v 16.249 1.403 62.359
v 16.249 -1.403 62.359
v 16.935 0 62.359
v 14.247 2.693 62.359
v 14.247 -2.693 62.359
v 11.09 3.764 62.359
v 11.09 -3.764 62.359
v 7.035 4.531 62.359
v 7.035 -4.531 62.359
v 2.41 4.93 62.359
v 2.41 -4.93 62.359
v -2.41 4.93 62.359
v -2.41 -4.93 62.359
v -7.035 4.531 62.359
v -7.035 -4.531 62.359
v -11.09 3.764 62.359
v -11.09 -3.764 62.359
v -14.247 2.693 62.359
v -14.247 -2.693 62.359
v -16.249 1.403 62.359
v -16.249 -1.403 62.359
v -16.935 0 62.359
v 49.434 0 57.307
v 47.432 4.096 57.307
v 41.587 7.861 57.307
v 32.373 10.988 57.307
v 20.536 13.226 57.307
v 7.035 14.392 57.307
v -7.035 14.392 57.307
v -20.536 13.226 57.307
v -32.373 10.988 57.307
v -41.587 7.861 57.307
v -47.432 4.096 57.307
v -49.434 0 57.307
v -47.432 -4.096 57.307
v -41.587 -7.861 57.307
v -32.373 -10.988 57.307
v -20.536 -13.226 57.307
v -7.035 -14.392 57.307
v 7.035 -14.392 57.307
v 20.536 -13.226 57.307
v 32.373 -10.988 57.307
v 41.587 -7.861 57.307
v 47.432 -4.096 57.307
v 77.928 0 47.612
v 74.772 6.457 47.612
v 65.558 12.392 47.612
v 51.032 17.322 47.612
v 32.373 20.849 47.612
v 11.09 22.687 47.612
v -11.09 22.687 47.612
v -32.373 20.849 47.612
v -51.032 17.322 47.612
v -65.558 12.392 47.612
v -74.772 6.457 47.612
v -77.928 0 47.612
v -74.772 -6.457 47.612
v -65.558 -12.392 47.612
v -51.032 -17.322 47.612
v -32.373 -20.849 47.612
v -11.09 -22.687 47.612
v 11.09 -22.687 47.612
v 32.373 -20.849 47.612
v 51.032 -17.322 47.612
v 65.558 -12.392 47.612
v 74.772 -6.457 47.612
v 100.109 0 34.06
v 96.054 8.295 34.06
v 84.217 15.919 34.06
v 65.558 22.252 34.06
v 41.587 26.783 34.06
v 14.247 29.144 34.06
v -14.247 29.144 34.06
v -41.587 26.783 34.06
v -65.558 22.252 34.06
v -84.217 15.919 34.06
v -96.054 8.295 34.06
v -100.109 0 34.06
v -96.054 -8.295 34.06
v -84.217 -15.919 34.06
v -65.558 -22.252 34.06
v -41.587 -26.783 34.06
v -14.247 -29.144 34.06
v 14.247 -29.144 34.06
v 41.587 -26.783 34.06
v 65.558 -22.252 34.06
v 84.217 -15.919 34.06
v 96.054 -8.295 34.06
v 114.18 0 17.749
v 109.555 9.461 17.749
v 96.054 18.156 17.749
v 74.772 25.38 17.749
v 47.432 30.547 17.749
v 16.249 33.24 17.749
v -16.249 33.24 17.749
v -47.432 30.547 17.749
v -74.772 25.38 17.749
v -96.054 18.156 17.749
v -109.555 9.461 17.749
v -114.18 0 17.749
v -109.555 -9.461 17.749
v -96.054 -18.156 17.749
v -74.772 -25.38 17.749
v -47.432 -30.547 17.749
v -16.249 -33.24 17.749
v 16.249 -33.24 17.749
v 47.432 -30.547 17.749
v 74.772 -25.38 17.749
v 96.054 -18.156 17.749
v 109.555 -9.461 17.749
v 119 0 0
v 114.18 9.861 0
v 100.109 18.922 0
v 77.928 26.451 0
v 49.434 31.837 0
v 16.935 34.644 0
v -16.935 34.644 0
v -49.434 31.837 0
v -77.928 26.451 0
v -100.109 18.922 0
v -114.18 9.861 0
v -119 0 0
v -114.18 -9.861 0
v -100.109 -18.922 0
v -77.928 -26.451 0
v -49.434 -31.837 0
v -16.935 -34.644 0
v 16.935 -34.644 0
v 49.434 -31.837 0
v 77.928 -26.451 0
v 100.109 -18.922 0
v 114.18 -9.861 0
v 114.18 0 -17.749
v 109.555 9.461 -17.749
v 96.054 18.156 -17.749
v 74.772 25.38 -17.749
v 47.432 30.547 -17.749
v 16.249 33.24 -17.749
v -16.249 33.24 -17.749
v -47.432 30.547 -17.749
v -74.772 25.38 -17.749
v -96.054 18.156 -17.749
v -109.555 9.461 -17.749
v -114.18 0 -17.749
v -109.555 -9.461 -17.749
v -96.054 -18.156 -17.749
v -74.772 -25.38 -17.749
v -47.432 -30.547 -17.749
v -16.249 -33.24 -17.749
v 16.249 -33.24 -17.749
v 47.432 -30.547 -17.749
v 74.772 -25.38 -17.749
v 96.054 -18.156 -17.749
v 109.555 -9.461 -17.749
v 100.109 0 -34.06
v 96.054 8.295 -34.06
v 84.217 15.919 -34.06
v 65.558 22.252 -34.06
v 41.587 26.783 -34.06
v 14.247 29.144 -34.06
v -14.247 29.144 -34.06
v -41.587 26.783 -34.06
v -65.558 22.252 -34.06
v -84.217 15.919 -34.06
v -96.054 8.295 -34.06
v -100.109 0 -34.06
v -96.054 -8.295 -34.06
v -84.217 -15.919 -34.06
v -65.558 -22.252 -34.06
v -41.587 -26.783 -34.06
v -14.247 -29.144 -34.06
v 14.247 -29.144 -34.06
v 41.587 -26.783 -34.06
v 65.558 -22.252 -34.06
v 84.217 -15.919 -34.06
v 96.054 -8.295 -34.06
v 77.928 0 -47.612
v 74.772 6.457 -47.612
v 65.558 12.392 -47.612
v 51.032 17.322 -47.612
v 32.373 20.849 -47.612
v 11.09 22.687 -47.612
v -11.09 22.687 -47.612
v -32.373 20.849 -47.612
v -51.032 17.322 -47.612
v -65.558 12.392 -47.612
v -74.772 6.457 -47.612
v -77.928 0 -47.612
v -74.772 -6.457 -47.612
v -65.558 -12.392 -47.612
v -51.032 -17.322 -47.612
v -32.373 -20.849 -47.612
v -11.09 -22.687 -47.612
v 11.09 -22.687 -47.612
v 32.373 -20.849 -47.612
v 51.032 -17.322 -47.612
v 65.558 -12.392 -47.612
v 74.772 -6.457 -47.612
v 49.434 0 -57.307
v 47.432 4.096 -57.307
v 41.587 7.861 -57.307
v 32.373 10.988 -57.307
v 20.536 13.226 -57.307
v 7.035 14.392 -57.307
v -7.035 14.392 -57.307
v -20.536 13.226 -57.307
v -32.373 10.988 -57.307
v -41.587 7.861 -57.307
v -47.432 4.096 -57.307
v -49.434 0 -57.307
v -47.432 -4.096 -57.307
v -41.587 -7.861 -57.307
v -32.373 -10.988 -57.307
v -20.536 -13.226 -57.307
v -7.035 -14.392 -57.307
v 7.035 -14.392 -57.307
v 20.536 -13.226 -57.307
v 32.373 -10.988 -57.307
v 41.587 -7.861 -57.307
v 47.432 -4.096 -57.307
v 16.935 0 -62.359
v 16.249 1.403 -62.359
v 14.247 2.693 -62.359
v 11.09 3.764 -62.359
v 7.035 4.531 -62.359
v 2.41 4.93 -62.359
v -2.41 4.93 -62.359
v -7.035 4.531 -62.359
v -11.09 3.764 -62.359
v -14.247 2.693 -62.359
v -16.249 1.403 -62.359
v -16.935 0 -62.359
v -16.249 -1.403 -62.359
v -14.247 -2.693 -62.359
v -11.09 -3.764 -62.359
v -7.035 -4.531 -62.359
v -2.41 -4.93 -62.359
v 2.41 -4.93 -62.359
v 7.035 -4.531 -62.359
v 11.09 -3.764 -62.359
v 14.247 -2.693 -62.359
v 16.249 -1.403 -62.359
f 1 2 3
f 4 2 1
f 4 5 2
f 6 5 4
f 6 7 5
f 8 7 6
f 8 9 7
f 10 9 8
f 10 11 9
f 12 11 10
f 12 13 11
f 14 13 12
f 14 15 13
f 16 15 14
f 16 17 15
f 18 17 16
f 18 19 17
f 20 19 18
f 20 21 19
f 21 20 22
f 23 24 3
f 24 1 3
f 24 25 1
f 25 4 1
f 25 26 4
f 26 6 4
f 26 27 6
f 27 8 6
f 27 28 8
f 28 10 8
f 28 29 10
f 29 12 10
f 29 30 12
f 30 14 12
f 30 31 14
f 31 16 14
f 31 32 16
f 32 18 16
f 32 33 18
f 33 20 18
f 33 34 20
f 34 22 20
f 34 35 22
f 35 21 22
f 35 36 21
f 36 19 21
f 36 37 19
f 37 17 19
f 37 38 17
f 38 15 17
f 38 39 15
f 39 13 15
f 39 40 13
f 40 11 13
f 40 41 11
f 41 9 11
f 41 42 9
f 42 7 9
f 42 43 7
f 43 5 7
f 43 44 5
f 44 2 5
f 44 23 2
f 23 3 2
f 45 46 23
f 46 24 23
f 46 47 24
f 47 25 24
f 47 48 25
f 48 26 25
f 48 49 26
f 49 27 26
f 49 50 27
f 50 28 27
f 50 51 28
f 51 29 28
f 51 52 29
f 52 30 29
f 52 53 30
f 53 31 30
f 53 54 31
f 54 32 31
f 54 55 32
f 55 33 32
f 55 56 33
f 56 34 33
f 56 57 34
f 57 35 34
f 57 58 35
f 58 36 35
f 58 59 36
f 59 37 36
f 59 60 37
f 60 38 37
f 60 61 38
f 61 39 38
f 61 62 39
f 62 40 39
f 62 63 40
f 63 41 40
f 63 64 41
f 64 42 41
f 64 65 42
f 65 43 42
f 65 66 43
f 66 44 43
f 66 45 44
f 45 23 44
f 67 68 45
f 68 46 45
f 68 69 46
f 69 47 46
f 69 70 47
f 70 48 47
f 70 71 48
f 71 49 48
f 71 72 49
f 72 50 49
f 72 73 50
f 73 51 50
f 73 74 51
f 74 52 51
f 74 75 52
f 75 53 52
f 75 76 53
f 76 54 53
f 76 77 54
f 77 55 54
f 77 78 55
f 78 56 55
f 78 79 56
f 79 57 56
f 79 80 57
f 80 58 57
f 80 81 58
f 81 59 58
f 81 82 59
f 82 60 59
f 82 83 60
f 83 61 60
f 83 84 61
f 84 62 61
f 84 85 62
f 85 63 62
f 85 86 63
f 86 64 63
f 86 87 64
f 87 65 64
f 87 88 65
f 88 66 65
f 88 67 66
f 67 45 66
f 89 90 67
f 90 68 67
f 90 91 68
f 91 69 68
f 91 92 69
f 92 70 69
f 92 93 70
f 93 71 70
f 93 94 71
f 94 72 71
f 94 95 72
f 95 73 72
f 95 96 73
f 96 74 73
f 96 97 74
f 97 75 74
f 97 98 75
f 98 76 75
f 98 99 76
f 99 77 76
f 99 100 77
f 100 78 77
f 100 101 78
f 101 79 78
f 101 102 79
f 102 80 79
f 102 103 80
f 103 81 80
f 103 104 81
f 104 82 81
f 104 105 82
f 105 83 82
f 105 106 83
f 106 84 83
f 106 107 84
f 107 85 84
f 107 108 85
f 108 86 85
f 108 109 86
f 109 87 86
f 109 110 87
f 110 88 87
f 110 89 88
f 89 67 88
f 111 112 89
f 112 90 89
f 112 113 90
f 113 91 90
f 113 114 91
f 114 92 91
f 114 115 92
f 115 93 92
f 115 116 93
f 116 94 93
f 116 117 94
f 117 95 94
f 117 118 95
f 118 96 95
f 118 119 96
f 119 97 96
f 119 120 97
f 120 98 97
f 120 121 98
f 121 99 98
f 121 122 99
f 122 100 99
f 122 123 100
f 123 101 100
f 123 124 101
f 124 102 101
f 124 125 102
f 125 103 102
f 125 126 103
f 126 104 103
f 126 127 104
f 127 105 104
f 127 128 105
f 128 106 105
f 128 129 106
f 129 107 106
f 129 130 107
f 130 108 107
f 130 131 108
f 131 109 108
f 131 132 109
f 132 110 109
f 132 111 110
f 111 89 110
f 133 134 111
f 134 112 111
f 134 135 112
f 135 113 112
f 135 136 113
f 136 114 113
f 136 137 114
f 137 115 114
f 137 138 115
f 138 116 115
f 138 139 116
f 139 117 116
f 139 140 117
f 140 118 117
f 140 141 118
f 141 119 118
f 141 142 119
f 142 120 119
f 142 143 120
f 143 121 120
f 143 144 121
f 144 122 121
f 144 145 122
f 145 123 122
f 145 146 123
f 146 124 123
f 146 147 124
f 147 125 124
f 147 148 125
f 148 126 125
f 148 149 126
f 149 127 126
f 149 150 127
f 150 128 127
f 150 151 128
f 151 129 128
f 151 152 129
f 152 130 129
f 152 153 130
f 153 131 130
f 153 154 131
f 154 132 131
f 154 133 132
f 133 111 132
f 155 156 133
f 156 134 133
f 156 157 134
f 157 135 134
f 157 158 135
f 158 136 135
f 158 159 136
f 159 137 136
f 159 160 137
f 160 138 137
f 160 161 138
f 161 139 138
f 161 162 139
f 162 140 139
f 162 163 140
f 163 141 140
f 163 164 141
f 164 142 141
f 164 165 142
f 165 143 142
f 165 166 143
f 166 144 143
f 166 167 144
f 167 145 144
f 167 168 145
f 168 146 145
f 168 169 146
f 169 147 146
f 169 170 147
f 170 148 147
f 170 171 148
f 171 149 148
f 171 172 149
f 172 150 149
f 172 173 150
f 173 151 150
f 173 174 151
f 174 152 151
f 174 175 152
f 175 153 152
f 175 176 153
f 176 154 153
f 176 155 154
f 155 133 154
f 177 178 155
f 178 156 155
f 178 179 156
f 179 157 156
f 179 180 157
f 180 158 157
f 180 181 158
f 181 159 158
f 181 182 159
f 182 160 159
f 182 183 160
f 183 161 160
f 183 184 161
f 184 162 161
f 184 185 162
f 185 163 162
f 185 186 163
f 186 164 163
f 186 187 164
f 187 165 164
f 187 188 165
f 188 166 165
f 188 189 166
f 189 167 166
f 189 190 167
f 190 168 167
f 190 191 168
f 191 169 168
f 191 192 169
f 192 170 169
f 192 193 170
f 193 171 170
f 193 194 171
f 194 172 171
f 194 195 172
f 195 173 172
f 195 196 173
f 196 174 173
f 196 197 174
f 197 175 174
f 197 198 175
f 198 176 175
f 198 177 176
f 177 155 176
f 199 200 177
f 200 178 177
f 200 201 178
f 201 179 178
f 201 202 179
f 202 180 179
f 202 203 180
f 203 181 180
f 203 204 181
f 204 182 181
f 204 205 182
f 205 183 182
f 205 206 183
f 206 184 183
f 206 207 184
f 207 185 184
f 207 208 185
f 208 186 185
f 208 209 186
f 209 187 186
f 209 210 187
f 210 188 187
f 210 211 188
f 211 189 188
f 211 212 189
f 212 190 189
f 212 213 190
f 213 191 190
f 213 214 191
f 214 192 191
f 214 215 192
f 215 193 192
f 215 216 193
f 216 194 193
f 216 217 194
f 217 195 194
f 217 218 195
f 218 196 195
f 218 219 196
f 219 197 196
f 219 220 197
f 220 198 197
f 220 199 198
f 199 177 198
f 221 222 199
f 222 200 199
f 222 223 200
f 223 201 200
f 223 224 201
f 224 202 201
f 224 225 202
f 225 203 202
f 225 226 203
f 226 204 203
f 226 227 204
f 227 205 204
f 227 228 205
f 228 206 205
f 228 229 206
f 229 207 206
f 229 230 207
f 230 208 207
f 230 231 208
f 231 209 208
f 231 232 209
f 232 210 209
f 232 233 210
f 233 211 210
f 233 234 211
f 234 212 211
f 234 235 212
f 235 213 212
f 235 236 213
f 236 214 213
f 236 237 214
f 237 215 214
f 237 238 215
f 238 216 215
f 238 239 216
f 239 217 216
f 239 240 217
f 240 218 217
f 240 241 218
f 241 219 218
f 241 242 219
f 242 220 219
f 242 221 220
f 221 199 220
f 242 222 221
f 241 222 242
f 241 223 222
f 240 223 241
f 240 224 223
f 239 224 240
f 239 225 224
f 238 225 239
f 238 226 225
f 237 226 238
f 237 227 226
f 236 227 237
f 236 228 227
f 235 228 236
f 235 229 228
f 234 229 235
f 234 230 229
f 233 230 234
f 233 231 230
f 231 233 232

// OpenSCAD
// Generated by SolidPython 1.0.1 on 2020-07-29 00:46:52


scale(v = [17, 5, 9]) {
	sphere(r = 7);
}
/***********************************************
*********      SolidPython code:      **********
************************************************
 
# import packages: SolidPython
from solid import *
from solid.utils import *
from itertools import chain, combinations, permutations


class Resize:

    def __init__(self, scad_file):
        self.scad_file = scad_file
        #self.scad_file = import_scad(scad_file)
        # cone/cylinder param:
        self.r1 = 0
        self.r2 = 0
        self.h = 0
        # rectangular prism param:
        self.w = 0
        self.l = 0
        # ellipse param:
        self.r = 0

    # import OpenScad code (file name corresponds to shape)


    # classify shape + parameters
    def assign(self, param1, param2, param3):
        if self.scad_file == 'cone.scad':
            self.r1 = param1
            self.r2 = param2
            self.h = param3
        elif self.scad_file == 'cylinder.scad':
            self.r1 = param1
            self.r2 = param2
            self.h = param3
        elif self.scad_file == 'rectangularPrism.scad':
            self.h = param1
            self.l = param2
            self.w = param3
        else:
            self.r = param1
            self.h = param2

    # resize parameters
    def iterate(self):
        x = range(3, 20, 2)
        i = 1
        if self.scad_file == 'cone.scad':
            tempList = list(permutations(x, 2))
            for temp in tempList:
                param1 = temp[0]
                param2 = temp[1]
                filepath = 'produced_scad_files/' + 'cone' + str(param1) + '_' + str(param2) + '_' + '.scad'
                scad_render_to_file(cylinder(h=param1, r1=param2, r2=0), filepath)

        elif self.scad_file == 'cylinder.scad':
            tempList = list(permutations(x, 3))
            for temp in tempList:
                param1 = temp[0]
                param2 = temp[1]
                filepath = 'produced_scad_files/' + 'cylinder' + str(param1) + '_' + str(param2) + '_' + '.scad'
                scad_render_to_file(cylinder(h=param1, r1=param2, r2=param2), filepath)

        elif self.scad_file == 'rectangularPrism.scad':
            tempList = list(permutations(x, 3))
            for temp in tempList:
                param1 = temp[0]
                param2 = temp[1]
                param3 = temp[2]
                filepath = 'produced_scad_files/' + 'rectangularPrism' + str(param1) + '_' + str(param2) + '_' + str(
                    param3) + '.scad'
                scad_render_to_file(cube(size=(param1, param2, param3)), filepath)

        elif self.scad_file == 'ellipse.scad':
            tempList = list(permutations(x, 4))
            for temp in tempList:
                param1 = temp[0]
                param2 = temp[1]
                param3 = temp[2]
                param4 = temp[3]
                filepath = 'produced_scad_files/' + 'ellipse' + str(param1) + '_' + str(param2) + '_' + str(param3) + '_' + str(param4) + '.scad'
                scad_render_to_file(scale([param1, param2, param3])(sphere(r=param4)), filepath)

    def render_to_scadfile(self):
        scad_render_to_file(scad, 'example.scad') 
 
************************************************/
